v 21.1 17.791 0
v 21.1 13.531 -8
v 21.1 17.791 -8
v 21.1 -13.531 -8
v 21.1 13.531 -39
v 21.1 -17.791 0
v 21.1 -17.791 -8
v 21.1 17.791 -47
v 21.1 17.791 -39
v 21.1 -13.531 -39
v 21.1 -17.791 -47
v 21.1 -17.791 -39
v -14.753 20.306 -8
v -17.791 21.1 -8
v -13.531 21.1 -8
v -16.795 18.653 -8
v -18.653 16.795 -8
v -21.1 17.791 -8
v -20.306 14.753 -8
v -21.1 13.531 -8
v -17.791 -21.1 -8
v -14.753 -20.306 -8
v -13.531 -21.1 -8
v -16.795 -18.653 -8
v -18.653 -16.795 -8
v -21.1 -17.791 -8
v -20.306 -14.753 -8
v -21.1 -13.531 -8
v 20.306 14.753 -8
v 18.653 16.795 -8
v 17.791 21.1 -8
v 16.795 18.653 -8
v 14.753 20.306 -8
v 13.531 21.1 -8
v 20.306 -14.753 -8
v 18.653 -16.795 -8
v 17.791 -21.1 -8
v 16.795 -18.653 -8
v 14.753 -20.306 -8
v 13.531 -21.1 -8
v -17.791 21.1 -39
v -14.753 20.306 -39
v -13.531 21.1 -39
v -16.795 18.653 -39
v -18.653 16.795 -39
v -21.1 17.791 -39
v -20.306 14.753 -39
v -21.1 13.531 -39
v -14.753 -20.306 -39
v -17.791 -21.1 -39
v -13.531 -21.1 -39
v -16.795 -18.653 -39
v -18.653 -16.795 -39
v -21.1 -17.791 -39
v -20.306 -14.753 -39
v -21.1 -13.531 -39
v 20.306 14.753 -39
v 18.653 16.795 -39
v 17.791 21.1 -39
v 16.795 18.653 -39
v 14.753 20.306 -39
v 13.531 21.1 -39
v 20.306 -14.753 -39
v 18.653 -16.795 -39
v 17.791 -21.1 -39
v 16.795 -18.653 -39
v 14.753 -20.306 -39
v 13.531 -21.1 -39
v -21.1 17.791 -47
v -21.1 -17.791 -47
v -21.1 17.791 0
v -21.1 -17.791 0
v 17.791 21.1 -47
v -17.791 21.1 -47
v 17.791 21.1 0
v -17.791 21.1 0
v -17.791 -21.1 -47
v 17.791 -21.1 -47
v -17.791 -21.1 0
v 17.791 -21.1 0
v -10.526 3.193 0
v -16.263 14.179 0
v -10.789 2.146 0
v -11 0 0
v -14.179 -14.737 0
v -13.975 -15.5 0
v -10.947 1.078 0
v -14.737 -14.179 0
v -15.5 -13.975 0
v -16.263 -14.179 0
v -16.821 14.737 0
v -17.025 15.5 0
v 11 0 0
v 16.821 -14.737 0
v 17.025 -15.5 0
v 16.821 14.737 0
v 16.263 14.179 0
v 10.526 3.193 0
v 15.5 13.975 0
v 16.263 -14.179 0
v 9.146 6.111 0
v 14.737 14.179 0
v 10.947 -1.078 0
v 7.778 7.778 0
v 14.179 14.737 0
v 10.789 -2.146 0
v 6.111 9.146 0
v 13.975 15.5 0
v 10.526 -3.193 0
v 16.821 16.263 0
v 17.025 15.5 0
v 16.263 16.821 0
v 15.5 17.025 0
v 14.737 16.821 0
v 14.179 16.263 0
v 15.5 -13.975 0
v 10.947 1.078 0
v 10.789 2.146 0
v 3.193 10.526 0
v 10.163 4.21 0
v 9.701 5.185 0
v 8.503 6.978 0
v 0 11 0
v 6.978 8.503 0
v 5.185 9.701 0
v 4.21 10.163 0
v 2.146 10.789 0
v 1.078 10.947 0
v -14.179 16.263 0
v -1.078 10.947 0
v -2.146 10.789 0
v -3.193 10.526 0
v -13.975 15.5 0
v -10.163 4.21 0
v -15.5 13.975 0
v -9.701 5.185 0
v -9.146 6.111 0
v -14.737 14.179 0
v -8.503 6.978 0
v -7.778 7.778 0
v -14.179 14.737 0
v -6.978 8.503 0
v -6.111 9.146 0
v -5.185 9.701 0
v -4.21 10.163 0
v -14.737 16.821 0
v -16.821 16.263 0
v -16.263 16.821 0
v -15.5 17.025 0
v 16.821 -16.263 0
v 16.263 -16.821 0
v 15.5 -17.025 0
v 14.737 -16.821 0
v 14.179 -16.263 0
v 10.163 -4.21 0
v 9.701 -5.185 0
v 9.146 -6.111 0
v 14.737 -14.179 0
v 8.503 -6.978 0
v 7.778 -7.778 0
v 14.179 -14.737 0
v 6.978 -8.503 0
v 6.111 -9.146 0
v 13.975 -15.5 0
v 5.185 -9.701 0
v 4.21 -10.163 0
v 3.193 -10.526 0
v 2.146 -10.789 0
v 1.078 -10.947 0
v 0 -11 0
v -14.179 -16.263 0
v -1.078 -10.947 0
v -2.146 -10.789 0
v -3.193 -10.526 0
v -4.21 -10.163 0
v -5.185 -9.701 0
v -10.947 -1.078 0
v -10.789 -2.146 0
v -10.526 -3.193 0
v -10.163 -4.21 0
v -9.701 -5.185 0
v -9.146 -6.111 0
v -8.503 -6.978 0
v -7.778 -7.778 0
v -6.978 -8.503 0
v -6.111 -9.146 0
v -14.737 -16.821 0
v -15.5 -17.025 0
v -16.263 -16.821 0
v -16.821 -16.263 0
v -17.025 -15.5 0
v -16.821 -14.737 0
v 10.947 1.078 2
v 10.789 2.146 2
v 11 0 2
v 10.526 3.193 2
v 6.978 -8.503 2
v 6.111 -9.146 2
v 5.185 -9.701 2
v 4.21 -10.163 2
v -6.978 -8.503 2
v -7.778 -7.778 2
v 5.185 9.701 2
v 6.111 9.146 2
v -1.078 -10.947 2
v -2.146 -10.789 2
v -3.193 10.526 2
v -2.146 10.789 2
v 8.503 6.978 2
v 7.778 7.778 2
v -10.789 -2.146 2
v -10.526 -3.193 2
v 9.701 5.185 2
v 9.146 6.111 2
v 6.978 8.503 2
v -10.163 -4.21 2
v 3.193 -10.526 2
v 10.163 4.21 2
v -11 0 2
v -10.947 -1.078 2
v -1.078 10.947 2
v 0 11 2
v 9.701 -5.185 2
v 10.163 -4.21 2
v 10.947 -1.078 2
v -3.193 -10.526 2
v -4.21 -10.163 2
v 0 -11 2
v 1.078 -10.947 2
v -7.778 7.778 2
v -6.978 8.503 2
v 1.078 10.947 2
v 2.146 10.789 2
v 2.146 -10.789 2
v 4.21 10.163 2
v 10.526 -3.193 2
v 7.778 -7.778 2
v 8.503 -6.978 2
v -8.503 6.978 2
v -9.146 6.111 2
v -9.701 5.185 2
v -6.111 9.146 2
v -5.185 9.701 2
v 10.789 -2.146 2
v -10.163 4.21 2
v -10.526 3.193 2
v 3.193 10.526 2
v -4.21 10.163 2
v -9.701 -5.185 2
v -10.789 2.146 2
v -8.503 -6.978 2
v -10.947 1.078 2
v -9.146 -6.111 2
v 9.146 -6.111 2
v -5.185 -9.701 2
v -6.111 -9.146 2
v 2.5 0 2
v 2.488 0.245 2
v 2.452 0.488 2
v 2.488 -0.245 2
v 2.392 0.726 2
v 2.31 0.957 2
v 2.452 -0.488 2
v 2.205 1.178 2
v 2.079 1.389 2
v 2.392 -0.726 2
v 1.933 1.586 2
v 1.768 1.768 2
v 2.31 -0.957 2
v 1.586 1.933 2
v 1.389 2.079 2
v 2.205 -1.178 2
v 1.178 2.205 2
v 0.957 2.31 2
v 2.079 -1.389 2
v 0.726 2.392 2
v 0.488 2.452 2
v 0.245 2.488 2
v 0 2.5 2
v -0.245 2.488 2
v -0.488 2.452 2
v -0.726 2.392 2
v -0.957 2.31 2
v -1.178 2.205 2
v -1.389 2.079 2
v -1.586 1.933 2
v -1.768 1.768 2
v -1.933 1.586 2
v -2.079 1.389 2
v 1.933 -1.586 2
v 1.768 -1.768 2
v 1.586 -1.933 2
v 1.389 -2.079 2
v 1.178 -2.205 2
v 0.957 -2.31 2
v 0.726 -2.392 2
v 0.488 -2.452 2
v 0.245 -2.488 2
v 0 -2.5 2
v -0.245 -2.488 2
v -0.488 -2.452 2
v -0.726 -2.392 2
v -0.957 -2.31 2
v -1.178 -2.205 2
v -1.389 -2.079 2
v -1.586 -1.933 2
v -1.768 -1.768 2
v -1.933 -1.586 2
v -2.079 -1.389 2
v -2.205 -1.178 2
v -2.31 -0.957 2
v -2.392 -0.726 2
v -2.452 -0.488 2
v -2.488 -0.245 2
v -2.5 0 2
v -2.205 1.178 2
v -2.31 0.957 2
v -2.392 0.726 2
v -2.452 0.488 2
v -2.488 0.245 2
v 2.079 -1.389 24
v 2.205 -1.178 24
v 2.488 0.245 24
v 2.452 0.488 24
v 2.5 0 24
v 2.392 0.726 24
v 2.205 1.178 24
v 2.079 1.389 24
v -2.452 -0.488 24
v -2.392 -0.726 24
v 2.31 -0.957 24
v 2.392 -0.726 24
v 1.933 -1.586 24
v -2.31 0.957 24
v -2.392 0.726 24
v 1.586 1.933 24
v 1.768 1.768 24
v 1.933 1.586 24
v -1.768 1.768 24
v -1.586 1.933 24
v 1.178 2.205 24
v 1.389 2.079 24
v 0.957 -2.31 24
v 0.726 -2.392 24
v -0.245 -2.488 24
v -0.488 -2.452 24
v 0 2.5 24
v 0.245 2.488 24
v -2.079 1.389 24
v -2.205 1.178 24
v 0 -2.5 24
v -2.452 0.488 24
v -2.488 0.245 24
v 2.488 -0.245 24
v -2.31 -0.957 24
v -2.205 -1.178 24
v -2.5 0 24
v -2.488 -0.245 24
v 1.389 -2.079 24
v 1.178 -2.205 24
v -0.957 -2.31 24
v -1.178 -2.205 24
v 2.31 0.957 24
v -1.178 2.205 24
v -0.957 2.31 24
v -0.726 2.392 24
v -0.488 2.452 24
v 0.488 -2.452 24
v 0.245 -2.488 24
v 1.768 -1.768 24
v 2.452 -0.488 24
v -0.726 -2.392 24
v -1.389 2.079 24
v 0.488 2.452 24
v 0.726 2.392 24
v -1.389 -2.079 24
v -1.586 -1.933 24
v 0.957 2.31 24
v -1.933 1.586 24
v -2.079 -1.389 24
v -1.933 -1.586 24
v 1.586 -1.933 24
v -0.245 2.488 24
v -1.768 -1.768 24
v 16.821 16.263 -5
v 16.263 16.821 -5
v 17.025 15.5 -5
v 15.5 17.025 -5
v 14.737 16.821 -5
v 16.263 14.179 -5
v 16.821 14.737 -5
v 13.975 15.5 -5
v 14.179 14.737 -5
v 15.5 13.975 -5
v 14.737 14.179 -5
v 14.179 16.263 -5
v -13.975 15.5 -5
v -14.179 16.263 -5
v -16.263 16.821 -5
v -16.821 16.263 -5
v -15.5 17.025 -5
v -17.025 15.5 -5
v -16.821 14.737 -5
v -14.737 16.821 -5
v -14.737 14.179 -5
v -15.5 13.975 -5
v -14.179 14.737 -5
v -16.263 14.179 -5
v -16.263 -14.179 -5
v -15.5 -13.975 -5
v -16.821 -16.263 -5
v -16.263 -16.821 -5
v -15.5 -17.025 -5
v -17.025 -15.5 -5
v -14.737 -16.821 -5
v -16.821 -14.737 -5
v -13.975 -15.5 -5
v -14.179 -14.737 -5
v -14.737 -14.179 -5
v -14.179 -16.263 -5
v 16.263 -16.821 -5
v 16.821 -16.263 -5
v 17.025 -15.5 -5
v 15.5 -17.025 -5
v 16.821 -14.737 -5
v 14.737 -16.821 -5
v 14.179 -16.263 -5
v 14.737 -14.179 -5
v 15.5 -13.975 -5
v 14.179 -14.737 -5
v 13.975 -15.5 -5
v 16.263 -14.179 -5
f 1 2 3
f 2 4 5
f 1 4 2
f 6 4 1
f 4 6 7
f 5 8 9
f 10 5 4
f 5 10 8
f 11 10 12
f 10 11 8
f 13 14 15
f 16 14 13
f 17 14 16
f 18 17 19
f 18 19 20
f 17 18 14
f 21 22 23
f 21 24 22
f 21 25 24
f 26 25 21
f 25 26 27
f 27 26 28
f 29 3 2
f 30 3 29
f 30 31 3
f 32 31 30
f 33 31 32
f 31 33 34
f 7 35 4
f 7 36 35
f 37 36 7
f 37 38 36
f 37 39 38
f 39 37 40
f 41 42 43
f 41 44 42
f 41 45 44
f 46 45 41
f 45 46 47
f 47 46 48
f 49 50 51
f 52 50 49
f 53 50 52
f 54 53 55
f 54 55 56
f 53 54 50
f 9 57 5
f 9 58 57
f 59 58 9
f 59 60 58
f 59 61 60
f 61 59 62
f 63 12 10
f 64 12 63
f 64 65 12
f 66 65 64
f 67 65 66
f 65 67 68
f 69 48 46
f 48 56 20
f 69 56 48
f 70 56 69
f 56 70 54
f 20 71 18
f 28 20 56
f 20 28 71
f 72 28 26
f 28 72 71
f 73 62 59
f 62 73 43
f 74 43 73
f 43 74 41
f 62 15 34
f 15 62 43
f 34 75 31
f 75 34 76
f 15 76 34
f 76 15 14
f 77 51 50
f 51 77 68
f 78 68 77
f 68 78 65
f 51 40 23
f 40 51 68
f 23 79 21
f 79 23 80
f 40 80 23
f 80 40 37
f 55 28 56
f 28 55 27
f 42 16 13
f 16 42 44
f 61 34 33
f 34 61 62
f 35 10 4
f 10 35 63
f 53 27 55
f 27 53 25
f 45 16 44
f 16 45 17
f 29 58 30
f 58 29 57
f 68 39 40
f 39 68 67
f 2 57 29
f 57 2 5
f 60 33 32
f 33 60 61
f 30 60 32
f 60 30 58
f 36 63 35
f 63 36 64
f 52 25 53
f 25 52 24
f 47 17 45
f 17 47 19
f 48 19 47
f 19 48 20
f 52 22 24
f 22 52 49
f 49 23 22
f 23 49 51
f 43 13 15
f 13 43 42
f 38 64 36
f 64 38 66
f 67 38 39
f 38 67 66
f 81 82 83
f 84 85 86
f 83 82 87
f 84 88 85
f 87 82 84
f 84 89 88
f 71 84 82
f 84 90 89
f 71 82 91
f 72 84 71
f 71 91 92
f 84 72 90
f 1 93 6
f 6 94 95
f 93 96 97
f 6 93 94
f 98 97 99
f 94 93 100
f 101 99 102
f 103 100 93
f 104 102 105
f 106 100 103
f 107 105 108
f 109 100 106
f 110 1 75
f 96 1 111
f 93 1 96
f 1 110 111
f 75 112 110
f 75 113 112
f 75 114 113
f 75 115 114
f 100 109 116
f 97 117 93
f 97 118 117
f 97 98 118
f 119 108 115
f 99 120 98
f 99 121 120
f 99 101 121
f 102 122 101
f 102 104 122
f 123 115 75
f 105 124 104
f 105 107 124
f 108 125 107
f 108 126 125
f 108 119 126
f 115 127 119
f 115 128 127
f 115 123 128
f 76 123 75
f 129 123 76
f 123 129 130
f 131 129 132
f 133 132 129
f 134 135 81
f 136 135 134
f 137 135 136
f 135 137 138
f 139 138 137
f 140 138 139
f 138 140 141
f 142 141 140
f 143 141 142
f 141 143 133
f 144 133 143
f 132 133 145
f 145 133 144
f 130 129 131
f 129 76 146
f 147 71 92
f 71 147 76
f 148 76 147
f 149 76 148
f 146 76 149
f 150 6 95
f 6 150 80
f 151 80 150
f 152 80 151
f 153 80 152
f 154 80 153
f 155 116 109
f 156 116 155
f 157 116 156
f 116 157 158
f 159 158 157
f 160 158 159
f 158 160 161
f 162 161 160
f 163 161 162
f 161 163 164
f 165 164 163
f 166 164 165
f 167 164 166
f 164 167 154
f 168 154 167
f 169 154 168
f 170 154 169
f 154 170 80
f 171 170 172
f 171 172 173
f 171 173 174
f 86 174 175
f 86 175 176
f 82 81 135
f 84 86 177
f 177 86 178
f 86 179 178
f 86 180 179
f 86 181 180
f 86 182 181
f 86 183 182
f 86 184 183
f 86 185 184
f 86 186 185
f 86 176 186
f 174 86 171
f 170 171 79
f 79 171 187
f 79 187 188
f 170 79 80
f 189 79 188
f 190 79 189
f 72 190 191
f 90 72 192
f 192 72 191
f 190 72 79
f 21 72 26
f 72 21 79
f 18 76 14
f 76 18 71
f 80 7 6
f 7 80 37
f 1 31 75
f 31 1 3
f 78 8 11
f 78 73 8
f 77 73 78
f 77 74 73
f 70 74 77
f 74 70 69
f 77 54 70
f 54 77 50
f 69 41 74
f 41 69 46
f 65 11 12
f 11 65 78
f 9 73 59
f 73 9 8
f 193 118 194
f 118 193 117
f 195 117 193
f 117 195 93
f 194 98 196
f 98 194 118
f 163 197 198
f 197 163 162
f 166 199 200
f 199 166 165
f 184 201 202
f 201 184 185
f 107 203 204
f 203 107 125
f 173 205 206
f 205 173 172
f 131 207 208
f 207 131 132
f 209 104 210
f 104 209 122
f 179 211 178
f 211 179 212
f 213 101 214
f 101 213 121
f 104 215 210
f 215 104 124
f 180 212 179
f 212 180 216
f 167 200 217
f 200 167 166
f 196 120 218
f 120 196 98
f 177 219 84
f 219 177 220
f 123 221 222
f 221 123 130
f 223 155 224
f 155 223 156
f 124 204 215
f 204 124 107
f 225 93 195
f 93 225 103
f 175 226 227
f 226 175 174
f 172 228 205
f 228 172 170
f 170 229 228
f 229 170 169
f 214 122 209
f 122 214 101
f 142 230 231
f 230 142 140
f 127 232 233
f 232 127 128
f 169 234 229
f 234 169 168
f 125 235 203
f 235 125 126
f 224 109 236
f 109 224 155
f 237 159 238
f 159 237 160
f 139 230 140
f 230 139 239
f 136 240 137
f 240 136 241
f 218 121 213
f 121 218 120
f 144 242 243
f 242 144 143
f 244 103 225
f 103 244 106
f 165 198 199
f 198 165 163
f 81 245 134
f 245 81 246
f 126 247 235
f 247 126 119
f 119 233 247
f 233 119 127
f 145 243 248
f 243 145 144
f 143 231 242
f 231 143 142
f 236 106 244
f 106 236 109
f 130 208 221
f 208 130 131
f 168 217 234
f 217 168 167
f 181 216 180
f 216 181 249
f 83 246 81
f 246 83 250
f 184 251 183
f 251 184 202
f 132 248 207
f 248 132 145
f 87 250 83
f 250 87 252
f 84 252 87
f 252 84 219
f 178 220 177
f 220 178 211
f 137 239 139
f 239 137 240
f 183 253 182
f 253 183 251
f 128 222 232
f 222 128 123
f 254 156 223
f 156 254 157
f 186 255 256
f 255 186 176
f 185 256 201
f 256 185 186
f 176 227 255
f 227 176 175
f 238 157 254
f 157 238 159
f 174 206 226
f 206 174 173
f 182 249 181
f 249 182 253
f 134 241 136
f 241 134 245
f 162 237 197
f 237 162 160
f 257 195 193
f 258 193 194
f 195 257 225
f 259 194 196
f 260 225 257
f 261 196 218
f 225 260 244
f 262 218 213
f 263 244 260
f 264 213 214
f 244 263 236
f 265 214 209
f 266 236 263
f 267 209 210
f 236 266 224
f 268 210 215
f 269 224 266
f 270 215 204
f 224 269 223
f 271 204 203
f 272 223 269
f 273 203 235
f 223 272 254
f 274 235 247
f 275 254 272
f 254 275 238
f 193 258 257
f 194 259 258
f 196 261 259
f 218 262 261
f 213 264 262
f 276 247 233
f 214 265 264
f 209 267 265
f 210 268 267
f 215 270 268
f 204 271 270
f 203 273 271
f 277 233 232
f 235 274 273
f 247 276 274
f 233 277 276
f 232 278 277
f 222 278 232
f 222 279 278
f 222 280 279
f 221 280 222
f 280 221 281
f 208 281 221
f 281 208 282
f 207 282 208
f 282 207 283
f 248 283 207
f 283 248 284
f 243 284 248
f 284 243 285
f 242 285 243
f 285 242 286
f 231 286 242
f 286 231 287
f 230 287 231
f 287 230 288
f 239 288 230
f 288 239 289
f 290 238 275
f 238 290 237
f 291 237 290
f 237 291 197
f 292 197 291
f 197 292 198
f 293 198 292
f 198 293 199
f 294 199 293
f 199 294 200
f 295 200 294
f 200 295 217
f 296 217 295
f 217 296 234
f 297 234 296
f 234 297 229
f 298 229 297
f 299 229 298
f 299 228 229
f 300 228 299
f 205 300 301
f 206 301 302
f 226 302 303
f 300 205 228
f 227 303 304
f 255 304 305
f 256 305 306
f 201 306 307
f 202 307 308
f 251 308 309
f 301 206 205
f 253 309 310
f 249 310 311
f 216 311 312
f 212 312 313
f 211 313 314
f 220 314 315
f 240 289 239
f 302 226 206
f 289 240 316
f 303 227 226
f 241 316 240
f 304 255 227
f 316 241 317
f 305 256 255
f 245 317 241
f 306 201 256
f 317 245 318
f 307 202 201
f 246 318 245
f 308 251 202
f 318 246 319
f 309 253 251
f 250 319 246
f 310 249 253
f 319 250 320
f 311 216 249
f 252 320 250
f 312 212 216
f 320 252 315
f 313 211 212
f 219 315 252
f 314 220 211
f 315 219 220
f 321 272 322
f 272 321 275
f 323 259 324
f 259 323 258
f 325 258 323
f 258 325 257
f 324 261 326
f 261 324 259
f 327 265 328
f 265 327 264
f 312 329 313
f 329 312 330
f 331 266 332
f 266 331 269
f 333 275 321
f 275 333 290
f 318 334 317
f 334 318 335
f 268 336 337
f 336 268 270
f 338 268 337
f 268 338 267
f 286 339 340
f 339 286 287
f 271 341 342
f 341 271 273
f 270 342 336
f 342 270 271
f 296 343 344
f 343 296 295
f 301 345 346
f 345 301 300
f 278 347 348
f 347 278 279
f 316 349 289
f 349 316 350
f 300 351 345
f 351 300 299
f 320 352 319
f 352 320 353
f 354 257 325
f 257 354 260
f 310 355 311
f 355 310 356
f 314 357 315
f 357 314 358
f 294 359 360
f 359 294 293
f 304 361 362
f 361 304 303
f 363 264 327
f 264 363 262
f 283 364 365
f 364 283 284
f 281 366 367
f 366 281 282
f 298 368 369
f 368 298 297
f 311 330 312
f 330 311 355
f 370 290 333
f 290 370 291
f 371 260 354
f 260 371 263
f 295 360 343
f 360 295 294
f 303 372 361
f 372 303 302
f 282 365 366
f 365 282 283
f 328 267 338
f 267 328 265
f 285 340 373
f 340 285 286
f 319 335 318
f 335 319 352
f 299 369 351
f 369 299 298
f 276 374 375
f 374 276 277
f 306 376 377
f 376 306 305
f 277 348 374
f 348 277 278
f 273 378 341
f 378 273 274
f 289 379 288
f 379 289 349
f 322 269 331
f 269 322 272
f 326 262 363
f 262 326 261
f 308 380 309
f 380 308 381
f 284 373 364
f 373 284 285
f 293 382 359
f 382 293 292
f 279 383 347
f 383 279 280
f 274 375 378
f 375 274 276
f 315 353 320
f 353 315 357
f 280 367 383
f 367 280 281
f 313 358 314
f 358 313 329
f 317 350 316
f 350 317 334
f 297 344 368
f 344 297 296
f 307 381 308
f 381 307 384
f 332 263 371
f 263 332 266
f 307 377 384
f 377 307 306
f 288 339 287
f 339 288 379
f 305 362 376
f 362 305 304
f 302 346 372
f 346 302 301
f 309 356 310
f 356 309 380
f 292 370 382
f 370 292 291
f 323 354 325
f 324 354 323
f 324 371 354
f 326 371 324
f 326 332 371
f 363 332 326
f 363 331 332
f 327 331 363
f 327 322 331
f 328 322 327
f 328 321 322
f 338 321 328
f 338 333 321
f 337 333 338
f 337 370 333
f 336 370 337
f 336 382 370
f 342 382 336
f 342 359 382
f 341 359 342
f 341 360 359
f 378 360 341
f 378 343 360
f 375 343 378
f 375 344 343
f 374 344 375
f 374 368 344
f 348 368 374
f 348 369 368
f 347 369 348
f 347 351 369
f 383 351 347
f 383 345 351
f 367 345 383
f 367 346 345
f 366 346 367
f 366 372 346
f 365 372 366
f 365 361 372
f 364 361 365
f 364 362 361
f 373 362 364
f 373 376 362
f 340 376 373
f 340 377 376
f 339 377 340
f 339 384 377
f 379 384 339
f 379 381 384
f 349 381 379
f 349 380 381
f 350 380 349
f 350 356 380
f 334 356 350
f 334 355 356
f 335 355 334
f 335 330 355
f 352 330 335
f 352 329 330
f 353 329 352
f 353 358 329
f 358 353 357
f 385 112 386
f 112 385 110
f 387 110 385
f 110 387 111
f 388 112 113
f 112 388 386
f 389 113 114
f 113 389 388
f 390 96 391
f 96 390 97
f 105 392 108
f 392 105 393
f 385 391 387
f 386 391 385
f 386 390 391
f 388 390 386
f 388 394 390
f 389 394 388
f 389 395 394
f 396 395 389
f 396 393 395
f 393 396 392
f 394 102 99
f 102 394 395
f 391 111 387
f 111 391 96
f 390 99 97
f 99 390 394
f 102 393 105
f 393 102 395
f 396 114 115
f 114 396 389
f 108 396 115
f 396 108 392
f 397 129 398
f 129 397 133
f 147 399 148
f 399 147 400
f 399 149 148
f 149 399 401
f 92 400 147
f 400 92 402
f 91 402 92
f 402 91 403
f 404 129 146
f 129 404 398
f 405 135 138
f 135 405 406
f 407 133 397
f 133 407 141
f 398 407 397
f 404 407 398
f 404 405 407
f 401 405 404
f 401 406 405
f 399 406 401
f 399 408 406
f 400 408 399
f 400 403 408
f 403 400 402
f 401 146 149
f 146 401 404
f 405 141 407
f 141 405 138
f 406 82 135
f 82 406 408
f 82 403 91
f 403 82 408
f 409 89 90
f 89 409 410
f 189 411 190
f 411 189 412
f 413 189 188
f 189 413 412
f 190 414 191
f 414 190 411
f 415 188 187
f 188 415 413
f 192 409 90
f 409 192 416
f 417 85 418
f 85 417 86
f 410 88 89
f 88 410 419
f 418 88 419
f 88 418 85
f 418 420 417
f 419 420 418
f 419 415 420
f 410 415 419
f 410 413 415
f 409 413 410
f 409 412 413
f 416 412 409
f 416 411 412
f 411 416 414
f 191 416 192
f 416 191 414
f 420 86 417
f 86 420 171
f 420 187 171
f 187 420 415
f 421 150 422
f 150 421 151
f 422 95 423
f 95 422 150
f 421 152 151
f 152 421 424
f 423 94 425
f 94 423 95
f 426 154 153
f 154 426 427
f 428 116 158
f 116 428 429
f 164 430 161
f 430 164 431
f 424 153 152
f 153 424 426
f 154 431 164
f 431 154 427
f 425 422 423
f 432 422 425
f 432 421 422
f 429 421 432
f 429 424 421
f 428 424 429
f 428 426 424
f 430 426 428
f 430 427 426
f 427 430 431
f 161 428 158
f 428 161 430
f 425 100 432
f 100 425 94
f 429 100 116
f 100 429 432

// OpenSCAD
// file: configuration.scad
// Increase this if your slicer or printer make holes too tight.
extra_radius = 0.1;

// OD = outside diameter, corner to corner.
m3_nut_od = 6.1;
m3_nut_radius = m3_nut_od/2 + 0.2 + extra_radius;
m3_washer_radius = 3.5 + extra_radius;

// Major diameter of metric 3mm thread.
m3_major = 2.85;
m3_radius = m3_major/2 + extra_radius;
m3_wide_radius = m3_major/2 + extra_radius + 0.2;
// For M3 holes that needs to be tapped in the plastic
m3_tap_radius = 2.5/2 + extra_radius;

// NEMA17 stepper motors.
motor_shaft_diameter = 5;
motor_shaft_radius = motor_shaft_diameter/2 + extra_radius;

// Frame brackets. M3x8mm screws work best with 3.6 mm brackets.
thickness = 3.6;

// OpenBeam or Misumi. Currently only 15x15 mm, but there is a plan
// to make models more parametric and allow 20x20 mm in the future.
extrusion = 15;

// Placement for the NEMA17 stepper motors.
motor_offset = 44;
motor_length = 47;
// main file
include <configuration.scad>;

capHeight = 8;

module cap() {
    h = capHeight;
    translate([0, 0, h/2])
    intersection() {
        cube([42.2, 42.2, h], center=true);
        rotate([0, 0, 45])
            cube([55, 55, h], center=true);
    }
}

module nema17() {
    // NEMA 17 stepper motor.
    difference() {
        union() {
            translate([0, 0, -motor_length/2])
                color([20/255, 20/255, 20/255])
                intersection() {
                    cube([42.2, 42.2, motor_length-2*capHeight], center=true);
                    cylinder(r=25.1, h=motor_length+1, center=true, $fn=60);
                }
            color("silver") {
            for(h=[-capHeight, -motor_length])
                translate([0, 0, h])
                    cap();
            cylinder(r=11, h=2, center=false, $fn=64);
            cylinder(r=2.5, h=24, center=false, $fn=64);
            }
        }
        for (a = [0:90:359]) {
            rotate([0, 0, a])
                translate([15.5, 15.5, 0])
                    cylinder(r=m3_radius, h=10, center=true, $fn=12);
        }
    }
}

nema17();
